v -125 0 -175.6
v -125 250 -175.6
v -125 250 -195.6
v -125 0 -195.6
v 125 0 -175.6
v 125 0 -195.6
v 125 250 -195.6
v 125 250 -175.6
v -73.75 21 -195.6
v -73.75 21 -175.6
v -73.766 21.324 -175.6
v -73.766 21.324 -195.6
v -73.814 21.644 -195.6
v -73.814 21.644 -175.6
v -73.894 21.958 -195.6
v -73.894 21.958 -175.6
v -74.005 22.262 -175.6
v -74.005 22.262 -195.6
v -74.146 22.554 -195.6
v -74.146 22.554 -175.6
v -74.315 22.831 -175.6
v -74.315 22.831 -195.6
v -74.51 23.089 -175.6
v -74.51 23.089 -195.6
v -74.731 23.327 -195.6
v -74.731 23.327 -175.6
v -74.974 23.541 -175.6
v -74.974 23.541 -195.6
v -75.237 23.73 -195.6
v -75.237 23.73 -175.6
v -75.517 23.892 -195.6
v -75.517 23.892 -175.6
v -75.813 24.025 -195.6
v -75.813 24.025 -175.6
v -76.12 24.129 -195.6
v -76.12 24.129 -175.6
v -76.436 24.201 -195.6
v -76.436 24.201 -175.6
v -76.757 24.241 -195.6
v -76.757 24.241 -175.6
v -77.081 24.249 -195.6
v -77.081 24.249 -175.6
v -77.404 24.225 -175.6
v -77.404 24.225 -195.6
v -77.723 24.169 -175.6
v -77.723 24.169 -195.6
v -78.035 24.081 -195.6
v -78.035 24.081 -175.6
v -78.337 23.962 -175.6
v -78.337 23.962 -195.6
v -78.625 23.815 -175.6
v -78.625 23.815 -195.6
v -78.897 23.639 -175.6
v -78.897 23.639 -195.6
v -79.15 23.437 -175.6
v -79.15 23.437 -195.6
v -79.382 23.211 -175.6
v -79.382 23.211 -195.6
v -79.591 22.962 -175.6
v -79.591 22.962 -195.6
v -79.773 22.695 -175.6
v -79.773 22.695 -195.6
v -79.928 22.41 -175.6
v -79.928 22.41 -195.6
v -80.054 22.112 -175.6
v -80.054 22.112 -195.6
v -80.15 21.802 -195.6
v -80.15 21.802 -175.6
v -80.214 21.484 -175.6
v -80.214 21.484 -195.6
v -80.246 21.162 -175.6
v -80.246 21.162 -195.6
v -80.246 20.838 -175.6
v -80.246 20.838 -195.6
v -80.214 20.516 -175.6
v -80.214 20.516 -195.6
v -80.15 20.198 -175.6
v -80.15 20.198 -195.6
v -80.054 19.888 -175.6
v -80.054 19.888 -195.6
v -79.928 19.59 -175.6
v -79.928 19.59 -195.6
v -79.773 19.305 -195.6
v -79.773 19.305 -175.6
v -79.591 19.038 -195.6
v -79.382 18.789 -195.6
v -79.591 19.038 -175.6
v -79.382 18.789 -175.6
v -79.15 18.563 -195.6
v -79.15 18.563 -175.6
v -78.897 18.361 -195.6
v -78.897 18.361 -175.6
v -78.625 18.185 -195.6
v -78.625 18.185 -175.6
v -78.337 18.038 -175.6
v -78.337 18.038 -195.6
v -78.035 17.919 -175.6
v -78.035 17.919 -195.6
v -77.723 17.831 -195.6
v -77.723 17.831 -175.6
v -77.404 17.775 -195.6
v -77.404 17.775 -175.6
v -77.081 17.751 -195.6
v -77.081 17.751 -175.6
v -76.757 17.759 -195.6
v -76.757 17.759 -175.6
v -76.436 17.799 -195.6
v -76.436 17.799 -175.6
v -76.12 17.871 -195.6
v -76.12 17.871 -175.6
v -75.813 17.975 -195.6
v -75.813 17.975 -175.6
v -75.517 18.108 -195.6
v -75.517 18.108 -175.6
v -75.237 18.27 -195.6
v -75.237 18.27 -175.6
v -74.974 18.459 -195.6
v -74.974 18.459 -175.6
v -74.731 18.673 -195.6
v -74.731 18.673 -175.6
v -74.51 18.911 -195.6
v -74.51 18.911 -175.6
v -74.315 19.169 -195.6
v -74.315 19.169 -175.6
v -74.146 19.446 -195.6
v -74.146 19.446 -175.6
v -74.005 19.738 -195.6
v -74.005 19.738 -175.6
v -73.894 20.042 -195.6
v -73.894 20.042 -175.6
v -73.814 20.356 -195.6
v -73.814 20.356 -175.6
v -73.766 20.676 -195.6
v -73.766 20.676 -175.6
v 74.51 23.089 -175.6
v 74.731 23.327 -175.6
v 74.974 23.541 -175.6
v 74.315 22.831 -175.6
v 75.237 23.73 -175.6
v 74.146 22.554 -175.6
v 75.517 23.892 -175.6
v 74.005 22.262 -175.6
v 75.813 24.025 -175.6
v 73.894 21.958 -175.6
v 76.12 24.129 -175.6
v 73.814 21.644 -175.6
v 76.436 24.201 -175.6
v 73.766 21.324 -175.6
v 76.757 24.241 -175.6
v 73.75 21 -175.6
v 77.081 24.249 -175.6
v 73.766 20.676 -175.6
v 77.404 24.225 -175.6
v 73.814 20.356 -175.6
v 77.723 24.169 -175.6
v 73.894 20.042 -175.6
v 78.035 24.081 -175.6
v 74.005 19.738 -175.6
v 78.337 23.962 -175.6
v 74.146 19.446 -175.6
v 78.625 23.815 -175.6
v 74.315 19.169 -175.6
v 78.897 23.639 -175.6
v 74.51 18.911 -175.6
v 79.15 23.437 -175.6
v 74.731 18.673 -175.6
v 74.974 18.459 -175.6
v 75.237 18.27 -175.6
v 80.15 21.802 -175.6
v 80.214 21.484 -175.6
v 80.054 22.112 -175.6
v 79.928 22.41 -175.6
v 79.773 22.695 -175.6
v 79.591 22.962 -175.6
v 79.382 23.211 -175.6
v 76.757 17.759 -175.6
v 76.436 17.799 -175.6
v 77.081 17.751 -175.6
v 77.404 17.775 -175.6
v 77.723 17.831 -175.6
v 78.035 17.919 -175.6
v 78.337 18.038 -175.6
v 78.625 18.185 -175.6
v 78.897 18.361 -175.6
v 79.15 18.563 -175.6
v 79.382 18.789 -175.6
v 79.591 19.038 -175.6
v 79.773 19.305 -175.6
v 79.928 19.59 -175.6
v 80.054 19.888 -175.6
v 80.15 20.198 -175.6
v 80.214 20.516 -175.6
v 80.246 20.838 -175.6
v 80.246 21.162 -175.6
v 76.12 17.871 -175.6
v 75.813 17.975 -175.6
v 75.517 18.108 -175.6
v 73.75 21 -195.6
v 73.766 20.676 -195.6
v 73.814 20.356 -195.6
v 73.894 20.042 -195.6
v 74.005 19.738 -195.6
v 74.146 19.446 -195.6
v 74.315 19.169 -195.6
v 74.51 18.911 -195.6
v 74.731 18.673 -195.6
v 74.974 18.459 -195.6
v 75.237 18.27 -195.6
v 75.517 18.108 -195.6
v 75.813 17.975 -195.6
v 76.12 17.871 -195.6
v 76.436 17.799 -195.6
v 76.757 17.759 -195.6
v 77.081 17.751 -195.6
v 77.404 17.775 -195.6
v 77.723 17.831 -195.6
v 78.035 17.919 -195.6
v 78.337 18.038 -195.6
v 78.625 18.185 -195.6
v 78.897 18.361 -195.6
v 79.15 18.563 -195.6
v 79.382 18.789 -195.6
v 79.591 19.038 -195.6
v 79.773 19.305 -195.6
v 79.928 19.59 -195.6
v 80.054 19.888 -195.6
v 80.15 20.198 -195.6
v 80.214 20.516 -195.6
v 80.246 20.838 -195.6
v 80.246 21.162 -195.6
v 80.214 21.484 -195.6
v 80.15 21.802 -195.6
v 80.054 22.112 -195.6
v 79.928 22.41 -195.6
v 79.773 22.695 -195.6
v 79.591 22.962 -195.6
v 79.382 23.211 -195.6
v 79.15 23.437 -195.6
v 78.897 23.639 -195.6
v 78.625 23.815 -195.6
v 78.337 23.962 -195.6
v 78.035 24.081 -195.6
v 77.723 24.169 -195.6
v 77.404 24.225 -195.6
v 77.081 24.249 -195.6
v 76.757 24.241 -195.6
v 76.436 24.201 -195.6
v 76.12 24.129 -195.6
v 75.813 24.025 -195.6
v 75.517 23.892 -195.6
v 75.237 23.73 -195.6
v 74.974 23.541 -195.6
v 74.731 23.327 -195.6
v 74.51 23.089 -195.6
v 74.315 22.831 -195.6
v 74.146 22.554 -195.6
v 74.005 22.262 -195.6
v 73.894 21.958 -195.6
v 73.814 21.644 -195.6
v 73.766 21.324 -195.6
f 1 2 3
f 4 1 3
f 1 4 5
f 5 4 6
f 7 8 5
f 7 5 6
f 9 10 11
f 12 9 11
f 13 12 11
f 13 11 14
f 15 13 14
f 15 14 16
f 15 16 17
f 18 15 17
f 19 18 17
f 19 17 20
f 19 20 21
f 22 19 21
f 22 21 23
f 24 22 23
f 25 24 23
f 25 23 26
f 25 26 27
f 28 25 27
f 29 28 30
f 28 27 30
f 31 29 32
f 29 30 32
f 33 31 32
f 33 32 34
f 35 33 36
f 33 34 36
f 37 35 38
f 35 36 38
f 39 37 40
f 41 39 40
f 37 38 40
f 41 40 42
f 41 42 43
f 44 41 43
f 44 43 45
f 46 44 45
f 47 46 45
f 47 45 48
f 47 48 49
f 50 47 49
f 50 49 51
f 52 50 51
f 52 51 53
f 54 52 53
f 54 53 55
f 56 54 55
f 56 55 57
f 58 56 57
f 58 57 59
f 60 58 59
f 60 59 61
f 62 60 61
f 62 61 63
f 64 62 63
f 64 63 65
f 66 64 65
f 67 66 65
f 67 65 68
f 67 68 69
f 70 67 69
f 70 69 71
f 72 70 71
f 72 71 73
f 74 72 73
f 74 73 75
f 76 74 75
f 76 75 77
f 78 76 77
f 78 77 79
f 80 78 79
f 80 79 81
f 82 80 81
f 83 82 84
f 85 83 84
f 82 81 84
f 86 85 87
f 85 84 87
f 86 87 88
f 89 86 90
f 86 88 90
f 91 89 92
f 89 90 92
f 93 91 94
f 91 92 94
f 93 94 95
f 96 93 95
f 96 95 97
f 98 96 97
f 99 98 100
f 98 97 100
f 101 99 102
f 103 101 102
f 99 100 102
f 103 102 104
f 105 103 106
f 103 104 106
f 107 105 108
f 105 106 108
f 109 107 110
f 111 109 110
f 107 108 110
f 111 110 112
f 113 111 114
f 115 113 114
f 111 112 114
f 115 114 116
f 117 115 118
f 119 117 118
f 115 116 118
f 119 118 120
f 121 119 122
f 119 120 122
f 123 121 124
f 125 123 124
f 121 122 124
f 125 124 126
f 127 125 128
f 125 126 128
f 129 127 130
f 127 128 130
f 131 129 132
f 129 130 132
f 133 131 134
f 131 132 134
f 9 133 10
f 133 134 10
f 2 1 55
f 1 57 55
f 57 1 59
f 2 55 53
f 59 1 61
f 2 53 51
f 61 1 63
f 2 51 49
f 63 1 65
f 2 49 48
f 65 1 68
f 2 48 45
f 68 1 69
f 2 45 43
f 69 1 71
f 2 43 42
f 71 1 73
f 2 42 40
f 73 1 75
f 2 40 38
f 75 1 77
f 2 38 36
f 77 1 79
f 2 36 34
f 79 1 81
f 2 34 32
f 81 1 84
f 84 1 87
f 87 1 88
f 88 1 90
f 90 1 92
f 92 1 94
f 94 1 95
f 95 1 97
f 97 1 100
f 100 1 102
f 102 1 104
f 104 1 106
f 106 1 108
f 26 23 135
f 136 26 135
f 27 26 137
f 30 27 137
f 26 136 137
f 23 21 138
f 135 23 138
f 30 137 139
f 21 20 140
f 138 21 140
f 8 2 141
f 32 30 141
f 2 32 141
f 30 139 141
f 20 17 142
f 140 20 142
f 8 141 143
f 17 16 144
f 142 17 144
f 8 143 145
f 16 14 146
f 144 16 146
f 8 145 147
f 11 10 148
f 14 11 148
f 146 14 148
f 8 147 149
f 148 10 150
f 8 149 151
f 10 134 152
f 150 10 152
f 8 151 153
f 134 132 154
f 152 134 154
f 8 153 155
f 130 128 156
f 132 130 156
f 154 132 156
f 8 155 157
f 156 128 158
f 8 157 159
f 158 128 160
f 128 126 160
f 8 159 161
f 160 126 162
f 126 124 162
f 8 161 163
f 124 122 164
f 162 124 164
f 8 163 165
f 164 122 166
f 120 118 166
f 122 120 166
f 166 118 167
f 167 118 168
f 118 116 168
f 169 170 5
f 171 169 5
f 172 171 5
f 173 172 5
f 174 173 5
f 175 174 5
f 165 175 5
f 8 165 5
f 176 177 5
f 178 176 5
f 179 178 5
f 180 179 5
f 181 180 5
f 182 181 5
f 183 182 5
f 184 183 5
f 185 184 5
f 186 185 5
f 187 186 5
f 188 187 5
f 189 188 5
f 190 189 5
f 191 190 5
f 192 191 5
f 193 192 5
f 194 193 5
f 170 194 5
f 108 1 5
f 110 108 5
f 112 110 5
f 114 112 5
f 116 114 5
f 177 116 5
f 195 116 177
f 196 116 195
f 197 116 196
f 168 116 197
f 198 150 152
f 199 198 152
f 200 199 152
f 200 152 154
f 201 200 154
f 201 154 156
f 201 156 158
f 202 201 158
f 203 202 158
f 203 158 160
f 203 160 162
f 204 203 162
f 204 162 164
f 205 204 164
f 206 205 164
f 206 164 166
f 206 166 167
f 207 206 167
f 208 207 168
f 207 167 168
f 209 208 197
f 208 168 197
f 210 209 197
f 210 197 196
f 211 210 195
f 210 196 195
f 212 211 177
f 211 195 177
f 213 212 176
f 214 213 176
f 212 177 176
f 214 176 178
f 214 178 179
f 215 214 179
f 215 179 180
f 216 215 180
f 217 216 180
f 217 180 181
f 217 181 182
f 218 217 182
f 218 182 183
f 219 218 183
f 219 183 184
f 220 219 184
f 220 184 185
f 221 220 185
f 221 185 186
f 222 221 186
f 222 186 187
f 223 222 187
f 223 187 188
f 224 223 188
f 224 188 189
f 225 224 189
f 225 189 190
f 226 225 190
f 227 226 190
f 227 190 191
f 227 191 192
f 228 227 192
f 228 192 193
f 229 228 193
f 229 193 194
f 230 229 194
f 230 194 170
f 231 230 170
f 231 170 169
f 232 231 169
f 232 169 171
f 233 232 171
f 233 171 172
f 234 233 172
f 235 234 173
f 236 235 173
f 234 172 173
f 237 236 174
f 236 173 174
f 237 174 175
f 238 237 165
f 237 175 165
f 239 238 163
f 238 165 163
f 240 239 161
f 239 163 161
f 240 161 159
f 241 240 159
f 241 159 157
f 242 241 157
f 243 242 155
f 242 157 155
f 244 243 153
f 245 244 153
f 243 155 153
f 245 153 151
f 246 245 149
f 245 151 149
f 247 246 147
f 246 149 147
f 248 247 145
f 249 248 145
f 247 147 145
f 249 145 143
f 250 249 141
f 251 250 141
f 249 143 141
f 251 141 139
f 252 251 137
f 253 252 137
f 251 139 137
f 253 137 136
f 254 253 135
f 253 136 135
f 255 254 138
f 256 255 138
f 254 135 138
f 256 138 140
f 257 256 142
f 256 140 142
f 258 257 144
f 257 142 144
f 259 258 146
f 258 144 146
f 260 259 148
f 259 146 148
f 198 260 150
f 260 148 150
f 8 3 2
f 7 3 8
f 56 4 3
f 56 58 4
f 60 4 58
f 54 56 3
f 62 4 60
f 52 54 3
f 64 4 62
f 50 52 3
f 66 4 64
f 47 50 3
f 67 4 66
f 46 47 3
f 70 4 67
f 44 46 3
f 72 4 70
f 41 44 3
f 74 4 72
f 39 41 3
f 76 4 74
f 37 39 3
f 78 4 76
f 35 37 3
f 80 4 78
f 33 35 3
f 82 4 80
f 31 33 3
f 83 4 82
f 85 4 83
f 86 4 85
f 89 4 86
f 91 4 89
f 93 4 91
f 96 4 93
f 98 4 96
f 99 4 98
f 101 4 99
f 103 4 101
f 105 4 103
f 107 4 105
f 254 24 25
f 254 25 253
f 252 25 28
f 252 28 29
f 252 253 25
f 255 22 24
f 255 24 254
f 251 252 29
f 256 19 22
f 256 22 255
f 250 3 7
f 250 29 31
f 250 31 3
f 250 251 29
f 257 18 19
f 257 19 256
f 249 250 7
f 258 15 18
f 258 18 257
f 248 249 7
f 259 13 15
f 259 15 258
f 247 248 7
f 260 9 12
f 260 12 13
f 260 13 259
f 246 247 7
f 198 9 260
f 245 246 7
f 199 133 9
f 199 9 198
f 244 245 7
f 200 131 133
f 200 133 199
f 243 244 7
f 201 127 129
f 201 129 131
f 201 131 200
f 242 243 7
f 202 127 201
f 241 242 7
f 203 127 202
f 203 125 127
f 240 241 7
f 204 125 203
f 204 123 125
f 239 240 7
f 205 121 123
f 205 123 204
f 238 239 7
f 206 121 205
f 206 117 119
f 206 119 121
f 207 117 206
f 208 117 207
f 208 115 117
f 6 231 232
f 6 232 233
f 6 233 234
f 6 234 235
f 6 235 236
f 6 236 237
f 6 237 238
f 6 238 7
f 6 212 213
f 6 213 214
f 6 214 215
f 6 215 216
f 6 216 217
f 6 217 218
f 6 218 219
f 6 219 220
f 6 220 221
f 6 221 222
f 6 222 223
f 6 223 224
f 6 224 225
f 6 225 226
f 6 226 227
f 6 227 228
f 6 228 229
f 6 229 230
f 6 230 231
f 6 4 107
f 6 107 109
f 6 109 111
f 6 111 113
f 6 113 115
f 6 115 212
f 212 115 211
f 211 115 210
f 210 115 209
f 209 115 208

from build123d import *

# Parameters (mm, degrees)
CROQUIS1_W              = 250
CROQUIS1_H              = 20
SALIENTE_EXTRUIR1_DEPTH = 250
CROQUIS2_R              = 3.25
CORTAR_EXTRUIR1_DEPTH   = 281.223125384


with BuildPart() as part:
    # Croquis1 → Saliente-Extruir1 (new body)
    with BuildSketch(Plane(origin=(0, 0, 0), x_dir=(1, 0, 0), z_dir=(0, 1, 0))):
        with Locations((0, 185.6)):
            Rectangle(CROQUIS1_W, CROQUIS1_H)
    extrude(amount=SALIENTE_EXTRUIR1_DEPTH)

    # Croquis2 → Cortar-Extruir1 (cut, through all)
    with BuildSketch(Plane.XY.offset(-175.6)):
        with Locations((-77, 21)):
            Circle(CROQUIS2_R)
        with Locations(Location((77, 21, 0), (0, 0, 180))):
            Circle(CROQUIS2_R)
    extrude(amount=-CORTAR_EXTRUIR1_DEPTH, mode=Mode.SUBTRACT)


solid = part.part
